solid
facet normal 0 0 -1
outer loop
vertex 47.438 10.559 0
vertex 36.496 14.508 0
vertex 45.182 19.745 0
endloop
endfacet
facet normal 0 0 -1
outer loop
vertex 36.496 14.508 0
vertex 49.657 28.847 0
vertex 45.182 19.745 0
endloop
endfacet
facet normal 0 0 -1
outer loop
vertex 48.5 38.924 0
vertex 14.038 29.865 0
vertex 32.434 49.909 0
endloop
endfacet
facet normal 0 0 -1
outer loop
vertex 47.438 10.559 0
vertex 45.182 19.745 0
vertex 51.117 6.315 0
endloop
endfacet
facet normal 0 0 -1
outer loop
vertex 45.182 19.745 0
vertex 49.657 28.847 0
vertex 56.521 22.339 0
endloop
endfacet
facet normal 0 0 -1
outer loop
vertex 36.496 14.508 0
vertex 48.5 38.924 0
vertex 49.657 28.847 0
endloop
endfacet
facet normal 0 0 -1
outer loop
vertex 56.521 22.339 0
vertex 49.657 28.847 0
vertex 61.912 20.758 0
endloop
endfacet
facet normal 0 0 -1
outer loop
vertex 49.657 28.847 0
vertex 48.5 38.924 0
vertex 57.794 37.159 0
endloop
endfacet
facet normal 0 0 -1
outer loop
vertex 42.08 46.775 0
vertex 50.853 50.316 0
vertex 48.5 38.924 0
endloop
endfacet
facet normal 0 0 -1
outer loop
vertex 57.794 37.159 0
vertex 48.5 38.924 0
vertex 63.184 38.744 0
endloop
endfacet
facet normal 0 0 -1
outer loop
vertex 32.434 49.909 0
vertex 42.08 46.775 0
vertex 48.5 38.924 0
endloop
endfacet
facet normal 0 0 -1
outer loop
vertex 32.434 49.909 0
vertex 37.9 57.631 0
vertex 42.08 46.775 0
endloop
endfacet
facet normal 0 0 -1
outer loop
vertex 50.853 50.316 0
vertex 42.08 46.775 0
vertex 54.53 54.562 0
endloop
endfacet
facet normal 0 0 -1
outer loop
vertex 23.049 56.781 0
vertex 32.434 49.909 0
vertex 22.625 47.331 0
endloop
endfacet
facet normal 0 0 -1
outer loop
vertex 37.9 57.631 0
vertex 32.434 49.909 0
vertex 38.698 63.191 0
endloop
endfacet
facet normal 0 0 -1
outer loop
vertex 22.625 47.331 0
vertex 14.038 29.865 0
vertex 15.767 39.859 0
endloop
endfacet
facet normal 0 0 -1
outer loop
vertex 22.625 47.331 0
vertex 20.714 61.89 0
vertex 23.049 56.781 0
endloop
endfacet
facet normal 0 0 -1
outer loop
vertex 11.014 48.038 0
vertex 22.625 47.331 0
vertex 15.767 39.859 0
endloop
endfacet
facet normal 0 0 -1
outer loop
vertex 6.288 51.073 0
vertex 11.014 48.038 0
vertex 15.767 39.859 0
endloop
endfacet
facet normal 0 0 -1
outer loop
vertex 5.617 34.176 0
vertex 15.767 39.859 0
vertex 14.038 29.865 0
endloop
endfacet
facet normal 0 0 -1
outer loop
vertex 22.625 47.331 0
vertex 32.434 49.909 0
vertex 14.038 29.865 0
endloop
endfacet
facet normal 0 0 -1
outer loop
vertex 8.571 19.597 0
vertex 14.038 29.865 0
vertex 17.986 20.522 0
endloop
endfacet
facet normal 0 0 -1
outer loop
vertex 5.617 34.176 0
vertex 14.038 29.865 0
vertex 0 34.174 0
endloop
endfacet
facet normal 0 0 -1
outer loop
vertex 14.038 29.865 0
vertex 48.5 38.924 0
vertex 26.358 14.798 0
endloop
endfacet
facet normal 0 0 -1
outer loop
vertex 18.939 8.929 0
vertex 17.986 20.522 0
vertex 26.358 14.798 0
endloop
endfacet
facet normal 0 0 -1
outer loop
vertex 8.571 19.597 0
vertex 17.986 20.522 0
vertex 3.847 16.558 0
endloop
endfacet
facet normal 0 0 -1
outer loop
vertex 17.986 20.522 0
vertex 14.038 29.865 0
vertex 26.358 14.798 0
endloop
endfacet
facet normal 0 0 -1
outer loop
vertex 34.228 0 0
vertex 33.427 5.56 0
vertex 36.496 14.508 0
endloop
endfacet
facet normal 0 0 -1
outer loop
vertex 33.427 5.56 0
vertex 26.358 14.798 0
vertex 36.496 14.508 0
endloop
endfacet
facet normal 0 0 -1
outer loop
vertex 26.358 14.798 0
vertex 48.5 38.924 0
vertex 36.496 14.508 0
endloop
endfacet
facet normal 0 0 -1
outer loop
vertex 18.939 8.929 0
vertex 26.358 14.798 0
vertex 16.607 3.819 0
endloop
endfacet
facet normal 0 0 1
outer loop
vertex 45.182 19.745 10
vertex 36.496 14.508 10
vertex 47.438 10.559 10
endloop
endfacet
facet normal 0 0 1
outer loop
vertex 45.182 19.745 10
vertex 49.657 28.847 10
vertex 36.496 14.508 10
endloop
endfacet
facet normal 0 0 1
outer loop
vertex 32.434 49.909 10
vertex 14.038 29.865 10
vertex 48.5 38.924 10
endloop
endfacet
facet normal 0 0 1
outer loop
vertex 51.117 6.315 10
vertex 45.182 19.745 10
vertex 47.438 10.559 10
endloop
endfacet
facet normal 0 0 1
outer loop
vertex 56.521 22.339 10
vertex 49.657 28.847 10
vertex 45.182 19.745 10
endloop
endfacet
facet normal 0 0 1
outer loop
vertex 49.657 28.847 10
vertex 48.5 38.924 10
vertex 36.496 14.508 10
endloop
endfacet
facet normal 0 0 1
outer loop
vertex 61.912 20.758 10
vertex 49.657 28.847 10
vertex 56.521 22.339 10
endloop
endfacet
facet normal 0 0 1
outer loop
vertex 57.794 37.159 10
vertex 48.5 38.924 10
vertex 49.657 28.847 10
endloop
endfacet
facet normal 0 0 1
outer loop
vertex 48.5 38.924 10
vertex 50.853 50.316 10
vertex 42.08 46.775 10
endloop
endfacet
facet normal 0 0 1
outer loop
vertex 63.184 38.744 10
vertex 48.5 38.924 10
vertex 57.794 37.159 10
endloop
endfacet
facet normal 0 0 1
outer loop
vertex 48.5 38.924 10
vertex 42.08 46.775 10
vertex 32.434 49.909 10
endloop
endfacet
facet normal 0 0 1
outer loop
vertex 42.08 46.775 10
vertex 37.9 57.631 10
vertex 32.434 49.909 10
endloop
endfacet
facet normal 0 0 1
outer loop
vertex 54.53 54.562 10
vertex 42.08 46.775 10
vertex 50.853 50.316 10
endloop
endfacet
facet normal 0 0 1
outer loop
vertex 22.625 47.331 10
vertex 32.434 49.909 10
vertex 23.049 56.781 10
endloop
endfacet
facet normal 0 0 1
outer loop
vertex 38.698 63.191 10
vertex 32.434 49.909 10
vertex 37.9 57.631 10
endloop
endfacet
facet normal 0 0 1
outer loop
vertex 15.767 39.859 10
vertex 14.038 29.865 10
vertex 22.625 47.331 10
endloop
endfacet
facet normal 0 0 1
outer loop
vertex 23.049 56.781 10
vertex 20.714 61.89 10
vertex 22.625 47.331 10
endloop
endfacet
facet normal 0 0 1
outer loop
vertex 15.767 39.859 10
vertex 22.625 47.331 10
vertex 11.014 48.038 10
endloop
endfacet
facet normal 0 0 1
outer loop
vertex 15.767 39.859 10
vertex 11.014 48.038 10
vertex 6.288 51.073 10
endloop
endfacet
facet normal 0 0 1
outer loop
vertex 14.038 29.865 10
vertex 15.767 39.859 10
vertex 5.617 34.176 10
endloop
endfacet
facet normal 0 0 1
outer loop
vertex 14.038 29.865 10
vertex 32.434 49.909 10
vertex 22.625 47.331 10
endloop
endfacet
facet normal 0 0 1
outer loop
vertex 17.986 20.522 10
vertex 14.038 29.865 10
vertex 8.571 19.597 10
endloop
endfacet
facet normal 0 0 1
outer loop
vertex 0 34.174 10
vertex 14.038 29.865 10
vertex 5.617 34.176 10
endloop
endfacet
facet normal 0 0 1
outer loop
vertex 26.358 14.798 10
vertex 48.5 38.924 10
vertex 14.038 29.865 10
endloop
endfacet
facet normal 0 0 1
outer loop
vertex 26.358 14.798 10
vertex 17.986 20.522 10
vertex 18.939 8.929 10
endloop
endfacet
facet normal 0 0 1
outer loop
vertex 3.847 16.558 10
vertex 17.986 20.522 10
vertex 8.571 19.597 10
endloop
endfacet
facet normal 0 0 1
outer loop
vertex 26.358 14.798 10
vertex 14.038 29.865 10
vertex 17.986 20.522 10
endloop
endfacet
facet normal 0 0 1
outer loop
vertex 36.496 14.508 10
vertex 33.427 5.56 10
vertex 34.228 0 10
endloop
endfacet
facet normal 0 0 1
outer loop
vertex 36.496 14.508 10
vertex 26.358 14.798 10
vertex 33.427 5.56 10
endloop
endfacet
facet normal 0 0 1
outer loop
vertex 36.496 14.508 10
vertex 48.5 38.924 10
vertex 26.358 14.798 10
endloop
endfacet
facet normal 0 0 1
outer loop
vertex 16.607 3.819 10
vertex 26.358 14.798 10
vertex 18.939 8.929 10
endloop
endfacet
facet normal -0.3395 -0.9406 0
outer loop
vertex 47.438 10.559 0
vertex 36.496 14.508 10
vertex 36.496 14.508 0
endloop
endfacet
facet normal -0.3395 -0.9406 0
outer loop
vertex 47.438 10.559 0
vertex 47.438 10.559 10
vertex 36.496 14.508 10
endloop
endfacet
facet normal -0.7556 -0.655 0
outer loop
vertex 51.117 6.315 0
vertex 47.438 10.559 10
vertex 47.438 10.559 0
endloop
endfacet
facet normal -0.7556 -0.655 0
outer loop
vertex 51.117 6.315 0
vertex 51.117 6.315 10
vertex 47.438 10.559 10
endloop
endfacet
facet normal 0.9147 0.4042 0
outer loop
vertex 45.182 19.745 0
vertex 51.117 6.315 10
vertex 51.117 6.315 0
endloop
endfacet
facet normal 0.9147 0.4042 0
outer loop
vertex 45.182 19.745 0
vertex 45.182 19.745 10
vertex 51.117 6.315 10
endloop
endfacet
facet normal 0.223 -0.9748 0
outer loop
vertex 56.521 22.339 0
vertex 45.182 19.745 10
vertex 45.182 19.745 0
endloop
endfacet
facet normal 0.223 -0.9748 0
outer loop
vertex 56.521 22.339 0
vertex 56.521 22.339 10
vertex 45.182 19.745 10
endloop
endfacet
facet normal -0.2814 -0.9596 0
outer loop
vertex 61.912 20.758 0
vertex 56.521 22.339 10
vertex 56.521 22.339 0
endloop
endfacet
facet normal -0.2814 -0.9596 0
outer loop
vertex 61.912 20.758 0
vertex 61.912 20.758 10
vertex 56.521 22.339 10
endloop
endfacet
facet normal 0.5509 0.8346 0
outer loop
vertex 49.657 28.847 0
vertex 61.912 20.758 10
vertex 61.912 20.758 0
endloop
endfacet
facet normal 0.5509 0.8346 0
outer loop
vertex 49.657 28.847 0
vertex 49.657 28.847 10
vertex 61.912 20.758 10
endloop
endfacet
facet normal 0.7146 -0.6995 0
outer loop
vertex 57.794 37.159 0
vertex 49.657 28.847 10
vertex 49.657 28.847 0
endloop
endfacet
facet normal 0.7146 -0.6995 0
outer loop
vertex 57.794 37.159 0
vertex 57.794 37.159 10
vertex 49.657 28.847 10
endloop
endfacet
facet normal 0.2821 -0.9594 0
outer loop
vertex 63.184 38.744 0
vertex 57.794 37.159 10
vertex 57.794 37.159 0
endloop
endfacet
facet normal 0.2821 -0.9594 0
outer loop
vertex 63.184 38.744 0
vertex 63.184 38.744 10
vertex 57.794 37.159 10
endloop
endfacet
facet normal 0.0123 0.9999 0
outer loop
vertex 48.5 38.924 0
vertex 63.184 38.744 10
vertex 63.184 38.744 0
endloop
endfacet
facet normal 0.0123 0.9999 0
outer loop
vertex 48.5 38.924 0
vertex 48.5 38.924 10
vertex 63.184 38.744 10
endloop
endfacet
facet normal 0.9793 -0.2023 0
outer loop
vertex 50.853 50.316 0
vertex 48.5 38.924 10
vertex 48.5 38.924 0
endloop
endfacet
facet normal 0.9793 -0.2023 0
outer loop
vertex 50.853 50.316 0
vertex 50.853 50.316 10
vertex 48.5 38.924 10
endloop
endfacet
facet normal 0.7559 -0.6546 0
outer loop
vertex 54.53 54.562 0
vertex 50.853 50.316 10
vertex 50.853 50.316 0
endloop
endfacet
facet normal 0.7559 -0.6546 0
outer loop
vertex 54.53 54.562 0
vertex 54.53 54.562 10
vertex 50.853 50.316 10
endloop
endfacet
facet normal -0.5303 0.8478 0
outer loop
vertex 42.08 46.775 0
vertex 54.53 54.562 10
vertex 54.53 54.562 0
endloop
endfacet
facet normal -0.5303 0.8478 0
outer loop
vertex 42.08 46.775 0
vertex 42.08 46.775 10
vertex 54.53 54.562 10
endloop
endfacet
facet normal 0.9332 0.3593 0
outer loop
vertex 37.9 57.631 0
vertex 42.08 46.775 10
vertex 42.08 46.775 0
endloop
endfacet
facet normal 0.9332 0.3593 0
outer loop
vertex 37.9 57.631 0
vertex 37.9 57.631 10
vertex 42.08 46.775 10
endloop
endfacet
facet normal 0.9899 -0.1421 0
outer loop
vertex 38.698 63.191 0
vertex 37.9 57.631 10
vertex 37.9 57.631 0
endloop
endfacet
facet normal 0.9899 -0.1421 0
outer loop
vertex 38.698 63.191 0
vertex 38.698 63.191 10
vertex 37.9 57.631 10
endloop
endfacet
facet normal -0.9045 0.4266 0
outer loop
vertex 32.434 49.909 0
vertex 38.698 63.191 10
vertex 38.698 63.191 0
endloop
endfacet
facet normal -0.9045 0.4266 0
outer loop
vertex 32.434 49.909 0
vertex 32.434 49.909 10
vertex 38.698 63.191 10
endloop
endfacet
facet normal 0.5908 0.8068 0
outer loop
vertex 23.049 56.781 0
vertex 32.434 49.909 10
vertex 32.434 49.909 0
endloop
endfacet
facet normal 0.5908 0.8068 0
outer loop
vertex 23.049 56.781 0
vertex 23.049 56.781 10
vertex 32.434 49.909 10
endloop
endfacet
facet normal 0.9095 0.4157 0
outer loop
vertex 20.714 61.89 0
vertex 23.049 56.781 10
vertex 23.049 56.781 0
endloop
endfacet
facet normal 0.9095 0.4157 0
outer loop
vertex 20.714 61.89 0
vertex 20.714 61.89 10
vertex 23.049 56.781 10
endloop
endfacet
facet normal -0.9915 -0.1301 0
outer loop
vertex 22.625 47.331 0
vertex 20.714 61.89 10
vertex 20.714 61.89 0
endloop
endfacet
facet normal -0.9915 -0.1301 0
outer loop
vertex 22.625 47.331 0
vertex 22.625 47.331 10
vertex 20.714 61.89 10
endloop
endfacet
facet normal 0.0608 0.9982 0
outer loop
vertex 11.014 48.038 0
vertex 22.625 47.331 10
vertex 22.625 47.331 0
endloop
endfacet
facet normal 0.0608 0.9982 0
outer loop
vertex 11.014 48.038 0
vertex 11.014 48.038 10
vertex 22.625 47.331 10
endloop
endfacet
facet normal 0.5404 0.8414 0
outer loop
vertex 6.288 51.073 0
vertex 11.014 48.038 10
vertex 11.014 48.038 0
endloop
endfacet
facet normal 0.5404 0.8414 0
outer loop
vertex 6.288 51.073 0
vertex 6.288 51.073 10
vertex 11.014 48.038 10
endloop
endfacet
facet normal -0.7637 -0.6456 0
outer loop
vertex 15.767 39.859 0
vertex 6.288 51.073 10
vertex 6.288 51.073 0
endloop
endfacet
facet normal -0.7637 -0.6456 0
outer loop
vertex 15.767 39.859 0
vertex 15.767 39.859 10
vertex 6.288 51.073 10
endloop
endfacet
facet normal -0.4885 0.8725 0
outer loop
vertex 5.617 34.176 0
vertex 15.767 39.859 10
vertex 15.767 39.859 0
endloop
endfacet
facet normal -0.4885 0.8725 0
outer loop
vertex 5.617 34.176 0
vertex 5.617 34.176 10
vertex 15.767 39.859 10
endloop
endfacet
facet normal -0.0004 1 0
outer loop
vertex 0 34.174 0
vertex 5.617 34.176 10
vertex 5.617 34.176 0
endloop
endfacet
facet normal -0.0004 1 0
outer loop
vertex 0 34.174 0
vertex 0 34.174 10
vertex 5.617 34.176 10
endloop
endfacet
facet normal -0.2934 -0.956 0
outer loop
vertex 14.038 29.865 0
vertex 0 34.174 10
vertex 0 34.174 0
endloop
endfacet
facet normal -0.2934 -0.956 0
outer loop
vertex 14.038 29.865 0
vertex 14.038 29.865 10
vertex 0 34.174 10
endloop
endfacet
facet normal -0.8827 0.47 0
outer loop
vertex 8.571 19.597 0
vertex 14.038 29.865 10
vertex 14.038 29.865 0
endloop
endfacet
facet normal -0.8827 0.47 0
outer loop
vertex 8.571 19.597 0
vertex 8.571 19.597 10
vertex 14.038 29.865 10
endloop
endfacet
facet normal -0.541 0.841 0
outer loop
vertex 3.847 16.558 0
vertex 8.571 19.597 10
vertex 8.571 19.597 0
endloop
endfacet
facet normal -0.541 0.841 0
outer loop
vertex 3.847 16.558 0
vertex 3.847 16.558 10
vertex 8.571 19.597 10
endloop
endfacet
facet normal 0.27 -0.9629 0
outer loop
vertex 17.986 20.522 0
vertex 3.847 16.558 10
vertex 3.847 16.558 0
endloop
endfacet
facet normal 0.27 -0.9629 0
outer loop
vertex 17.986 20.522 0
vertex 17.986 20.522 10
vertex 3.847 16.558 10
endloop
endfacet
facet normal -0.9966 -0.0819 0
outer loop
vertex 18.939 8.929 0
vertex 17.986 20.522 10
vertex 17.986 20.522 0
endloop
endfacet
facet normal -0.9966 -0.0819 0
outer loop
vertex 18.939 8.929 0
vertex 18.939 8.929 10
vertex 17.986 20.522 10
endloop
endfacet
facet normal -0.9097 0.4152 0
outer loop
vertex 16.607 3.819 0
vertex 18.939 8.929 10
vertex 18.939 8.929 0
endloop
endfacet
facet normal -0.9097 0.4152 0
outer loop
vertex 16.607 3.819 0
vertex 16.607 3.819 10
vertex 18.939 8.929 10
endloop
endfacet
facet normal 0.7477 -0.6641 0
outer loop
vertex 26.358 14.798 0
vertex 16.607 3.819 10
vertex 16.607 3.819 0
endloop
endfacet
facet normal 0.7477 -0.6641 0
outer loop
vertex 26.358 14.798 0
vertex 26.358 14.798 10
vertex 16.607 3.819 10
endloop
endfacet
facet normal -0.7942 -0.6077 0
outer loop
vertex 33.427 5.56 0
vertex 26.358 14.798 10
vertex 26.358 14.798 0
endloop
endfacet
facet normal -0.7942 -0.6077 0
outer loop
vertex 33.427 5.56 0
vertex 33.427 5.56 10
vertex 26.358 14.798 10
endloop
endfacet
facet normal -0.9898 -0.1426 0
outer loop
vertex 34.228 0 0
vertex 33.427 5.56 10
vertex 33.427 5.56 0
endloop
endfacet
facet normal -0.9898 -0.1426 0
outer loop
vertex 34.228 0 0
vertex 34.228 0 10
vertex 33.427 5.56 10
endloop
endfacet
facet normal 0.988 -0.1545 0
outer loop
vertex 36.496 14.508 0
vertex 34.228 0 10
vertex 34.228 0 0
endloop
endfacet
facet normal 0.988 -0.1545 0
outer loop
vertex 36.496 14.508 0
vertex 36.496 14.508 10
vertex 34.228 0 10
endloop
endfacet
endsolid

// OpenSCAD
$fn = 32;

// ----------------------------------------------------------------------
// Fan rotor section: 11 blades, 18 mm hub radius, 14 mm blades
// ----------------------------------------------------------------------

// --- parameters (mm) ---
profile_height = 10;      // extrusion height
profile_points = 33;      // points of the closed outline

profile = [[49.657, 28.847], [57.794, 37.159], [63.184, 38.744], [48.5, 38.924], [50.853, 50.316], [54.53, 54.562], [42.08, 46.775], [37.9, 57.631], [38.698, 63.191], [32.434, 49.909], [23.049, 56.781], [20.714, 61.89], [22.625, 47.331], [11.014, 48.038], [6.288, 51.073], [15.767, 39.859], [5.617, 34.176], [0, 34.174], [14.038, 29.865], [8.571, 19.597], [3.847, 16.558], [17.986, 20.522], [18.939, 8.929], [16.607, 3.819], [26.358, 14.798], [33.427, 5.56], [34.228, 0], [36.496, 14.508], [47.438, 10.559], [51.117, 6.315], [45.182, 19.745], [56.521, 22.339], [61.912, 20.758]];  // single closed polygon, 33 points, counter clockwise

// --- the one profile operation ---
linear_extrude(height = profile_height) polygon(points = profile);
